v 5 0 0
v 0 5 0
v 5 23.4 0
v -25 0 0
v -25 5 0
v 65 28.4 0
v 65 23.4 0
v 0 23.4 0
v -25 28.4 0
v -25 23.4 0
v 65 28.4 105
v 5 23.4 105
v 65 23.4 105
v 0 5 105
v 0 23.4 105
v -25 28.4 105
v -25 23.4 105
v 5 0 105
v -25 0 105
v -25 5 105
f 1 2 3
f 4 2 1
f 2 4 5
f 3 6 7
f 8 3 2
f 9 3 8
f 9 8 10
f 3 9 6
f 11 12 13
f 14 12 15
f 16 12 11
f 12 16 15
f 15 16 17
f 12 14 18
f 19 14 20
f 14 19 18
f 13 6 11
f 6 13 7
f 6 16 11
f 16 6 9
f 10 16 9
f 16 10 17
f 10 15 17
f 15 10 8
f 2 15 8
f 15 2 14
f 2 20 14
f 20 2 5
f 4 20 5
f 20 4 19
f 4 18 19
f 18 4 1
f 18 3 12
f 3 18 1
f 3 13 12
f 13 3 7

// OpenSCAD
// --- Dimensions ---
shelf_thickness = 18.0;      // Thickness of the shelf (mm)
clamp_gap = 18.4;            // Gap for the shelf (mm)
spine_width = 5.0;           // Width of the vertical spine (mm)
spine_depth = 28.4;          // Depth of the spine (mm)
bottom_jaw_width = 25.0;     // Width of the bottom jaw (mm)
bottom_jaw_depth = 5.0;       // Depth of the bottom jaw (mm)
arm_length = 65.0;           // Length of the arm extending forward (mm)
total_height = 105.0;        // Extrusion length along Z (mm)
hole_diameter = 20.0;        // Diameter of pipette holes (mm)
hole_x_offset = 42.0;        // X position of hole centers (mm)

// Hole Z-positions (as specified for the print orientation)
hole_z_1 = 17.5;
hole_z_2 = 52.5;
hole_z_3 = 87.5;

// --- Constants ---
$fn = 64;

// --- Modeling ---

// The user specified:
// 1. Print orientation: Lying on its side, XY plane is the profile, Z is extrusion (105mm).
// 2. Profile: 
//    - Spine: x=[0, 5], y=[0, 28.4]
//    - Bottom jaw: x=[-25, 5], y=[0, 5]
//    - Top jaw/arm: x=[-25, 65], y=[23.4, 28.4]
// 3. Holes: 20mm diameter, through the arm along Y (vertically in use).
//    - In use, +Y is up. In print orientation, Z is the extrusion (105mm).
//    - If the holes are "vertically in use" (+Y is up), the hole axis must be the Y axis.
//    - This means the holes are drilled through the "depth" of the profile.

module profile_shape() {
    union() {
        // Spine: x=[0, 5], y=[0, 28.4]
        translate([0, 0])
            square([spine_width, spine_depth]);
        
        // Bottom Jaw: x=[-25, 5], y=[0, 5]
        translate([-bottom_jaw_width, 0])
            square([bottom_jaw_width + spine_width, bottom_jaw_depth]);
        
        // Top Jaw and Arm: x=[-25, 65], y=[23.4, 28.4]
        // Note: The user specified the top jaw is at y=23.4 to 28.4.
        // The arm extends to x=65.
        translate([-bottom_jaw_width, 23.4])
            square([bottom_jaw_width + arm_length, 5.0]);
    }
}

// The part is built by extruding the 2D profile along Z.
// The holes are subtracted from the 3D volume.
// To ensure the holes appear in the horizontal slices (Z-slices), 
// the subtraction must be performed on the 3D object.

difference() {
    // Main Body
    linear_extrude(height = total_height)
        profile_shape();

    // Holes
    // The user says: "three round 20 mm holes go through the arm along Y (vertically in use)".
    // In the print orientation, +Y is the depth of the profile (0 to 28.4).
    // To cut "through the arm along Y", the cylinder axis must be the Y axis.
    // The holes are centered at x=42 and z=17.5, 52.5, 87.5.
    for (z_pos = [hole_z_1, hole_z_2, hole_z_3]) {
        // We translate to the center of the hole.
        // We rotate 90 degrees around X to align the cylinder axis with Y.
        // We extend the cylinder in Y to ensure it cuts through the entire profile.
        translate([hole_x_offset, -1, z_pos]) 
            rotate([0, 90, 0])
                cylinder(d = hole_diameter, h = spine_depth + 2);
    }
}
